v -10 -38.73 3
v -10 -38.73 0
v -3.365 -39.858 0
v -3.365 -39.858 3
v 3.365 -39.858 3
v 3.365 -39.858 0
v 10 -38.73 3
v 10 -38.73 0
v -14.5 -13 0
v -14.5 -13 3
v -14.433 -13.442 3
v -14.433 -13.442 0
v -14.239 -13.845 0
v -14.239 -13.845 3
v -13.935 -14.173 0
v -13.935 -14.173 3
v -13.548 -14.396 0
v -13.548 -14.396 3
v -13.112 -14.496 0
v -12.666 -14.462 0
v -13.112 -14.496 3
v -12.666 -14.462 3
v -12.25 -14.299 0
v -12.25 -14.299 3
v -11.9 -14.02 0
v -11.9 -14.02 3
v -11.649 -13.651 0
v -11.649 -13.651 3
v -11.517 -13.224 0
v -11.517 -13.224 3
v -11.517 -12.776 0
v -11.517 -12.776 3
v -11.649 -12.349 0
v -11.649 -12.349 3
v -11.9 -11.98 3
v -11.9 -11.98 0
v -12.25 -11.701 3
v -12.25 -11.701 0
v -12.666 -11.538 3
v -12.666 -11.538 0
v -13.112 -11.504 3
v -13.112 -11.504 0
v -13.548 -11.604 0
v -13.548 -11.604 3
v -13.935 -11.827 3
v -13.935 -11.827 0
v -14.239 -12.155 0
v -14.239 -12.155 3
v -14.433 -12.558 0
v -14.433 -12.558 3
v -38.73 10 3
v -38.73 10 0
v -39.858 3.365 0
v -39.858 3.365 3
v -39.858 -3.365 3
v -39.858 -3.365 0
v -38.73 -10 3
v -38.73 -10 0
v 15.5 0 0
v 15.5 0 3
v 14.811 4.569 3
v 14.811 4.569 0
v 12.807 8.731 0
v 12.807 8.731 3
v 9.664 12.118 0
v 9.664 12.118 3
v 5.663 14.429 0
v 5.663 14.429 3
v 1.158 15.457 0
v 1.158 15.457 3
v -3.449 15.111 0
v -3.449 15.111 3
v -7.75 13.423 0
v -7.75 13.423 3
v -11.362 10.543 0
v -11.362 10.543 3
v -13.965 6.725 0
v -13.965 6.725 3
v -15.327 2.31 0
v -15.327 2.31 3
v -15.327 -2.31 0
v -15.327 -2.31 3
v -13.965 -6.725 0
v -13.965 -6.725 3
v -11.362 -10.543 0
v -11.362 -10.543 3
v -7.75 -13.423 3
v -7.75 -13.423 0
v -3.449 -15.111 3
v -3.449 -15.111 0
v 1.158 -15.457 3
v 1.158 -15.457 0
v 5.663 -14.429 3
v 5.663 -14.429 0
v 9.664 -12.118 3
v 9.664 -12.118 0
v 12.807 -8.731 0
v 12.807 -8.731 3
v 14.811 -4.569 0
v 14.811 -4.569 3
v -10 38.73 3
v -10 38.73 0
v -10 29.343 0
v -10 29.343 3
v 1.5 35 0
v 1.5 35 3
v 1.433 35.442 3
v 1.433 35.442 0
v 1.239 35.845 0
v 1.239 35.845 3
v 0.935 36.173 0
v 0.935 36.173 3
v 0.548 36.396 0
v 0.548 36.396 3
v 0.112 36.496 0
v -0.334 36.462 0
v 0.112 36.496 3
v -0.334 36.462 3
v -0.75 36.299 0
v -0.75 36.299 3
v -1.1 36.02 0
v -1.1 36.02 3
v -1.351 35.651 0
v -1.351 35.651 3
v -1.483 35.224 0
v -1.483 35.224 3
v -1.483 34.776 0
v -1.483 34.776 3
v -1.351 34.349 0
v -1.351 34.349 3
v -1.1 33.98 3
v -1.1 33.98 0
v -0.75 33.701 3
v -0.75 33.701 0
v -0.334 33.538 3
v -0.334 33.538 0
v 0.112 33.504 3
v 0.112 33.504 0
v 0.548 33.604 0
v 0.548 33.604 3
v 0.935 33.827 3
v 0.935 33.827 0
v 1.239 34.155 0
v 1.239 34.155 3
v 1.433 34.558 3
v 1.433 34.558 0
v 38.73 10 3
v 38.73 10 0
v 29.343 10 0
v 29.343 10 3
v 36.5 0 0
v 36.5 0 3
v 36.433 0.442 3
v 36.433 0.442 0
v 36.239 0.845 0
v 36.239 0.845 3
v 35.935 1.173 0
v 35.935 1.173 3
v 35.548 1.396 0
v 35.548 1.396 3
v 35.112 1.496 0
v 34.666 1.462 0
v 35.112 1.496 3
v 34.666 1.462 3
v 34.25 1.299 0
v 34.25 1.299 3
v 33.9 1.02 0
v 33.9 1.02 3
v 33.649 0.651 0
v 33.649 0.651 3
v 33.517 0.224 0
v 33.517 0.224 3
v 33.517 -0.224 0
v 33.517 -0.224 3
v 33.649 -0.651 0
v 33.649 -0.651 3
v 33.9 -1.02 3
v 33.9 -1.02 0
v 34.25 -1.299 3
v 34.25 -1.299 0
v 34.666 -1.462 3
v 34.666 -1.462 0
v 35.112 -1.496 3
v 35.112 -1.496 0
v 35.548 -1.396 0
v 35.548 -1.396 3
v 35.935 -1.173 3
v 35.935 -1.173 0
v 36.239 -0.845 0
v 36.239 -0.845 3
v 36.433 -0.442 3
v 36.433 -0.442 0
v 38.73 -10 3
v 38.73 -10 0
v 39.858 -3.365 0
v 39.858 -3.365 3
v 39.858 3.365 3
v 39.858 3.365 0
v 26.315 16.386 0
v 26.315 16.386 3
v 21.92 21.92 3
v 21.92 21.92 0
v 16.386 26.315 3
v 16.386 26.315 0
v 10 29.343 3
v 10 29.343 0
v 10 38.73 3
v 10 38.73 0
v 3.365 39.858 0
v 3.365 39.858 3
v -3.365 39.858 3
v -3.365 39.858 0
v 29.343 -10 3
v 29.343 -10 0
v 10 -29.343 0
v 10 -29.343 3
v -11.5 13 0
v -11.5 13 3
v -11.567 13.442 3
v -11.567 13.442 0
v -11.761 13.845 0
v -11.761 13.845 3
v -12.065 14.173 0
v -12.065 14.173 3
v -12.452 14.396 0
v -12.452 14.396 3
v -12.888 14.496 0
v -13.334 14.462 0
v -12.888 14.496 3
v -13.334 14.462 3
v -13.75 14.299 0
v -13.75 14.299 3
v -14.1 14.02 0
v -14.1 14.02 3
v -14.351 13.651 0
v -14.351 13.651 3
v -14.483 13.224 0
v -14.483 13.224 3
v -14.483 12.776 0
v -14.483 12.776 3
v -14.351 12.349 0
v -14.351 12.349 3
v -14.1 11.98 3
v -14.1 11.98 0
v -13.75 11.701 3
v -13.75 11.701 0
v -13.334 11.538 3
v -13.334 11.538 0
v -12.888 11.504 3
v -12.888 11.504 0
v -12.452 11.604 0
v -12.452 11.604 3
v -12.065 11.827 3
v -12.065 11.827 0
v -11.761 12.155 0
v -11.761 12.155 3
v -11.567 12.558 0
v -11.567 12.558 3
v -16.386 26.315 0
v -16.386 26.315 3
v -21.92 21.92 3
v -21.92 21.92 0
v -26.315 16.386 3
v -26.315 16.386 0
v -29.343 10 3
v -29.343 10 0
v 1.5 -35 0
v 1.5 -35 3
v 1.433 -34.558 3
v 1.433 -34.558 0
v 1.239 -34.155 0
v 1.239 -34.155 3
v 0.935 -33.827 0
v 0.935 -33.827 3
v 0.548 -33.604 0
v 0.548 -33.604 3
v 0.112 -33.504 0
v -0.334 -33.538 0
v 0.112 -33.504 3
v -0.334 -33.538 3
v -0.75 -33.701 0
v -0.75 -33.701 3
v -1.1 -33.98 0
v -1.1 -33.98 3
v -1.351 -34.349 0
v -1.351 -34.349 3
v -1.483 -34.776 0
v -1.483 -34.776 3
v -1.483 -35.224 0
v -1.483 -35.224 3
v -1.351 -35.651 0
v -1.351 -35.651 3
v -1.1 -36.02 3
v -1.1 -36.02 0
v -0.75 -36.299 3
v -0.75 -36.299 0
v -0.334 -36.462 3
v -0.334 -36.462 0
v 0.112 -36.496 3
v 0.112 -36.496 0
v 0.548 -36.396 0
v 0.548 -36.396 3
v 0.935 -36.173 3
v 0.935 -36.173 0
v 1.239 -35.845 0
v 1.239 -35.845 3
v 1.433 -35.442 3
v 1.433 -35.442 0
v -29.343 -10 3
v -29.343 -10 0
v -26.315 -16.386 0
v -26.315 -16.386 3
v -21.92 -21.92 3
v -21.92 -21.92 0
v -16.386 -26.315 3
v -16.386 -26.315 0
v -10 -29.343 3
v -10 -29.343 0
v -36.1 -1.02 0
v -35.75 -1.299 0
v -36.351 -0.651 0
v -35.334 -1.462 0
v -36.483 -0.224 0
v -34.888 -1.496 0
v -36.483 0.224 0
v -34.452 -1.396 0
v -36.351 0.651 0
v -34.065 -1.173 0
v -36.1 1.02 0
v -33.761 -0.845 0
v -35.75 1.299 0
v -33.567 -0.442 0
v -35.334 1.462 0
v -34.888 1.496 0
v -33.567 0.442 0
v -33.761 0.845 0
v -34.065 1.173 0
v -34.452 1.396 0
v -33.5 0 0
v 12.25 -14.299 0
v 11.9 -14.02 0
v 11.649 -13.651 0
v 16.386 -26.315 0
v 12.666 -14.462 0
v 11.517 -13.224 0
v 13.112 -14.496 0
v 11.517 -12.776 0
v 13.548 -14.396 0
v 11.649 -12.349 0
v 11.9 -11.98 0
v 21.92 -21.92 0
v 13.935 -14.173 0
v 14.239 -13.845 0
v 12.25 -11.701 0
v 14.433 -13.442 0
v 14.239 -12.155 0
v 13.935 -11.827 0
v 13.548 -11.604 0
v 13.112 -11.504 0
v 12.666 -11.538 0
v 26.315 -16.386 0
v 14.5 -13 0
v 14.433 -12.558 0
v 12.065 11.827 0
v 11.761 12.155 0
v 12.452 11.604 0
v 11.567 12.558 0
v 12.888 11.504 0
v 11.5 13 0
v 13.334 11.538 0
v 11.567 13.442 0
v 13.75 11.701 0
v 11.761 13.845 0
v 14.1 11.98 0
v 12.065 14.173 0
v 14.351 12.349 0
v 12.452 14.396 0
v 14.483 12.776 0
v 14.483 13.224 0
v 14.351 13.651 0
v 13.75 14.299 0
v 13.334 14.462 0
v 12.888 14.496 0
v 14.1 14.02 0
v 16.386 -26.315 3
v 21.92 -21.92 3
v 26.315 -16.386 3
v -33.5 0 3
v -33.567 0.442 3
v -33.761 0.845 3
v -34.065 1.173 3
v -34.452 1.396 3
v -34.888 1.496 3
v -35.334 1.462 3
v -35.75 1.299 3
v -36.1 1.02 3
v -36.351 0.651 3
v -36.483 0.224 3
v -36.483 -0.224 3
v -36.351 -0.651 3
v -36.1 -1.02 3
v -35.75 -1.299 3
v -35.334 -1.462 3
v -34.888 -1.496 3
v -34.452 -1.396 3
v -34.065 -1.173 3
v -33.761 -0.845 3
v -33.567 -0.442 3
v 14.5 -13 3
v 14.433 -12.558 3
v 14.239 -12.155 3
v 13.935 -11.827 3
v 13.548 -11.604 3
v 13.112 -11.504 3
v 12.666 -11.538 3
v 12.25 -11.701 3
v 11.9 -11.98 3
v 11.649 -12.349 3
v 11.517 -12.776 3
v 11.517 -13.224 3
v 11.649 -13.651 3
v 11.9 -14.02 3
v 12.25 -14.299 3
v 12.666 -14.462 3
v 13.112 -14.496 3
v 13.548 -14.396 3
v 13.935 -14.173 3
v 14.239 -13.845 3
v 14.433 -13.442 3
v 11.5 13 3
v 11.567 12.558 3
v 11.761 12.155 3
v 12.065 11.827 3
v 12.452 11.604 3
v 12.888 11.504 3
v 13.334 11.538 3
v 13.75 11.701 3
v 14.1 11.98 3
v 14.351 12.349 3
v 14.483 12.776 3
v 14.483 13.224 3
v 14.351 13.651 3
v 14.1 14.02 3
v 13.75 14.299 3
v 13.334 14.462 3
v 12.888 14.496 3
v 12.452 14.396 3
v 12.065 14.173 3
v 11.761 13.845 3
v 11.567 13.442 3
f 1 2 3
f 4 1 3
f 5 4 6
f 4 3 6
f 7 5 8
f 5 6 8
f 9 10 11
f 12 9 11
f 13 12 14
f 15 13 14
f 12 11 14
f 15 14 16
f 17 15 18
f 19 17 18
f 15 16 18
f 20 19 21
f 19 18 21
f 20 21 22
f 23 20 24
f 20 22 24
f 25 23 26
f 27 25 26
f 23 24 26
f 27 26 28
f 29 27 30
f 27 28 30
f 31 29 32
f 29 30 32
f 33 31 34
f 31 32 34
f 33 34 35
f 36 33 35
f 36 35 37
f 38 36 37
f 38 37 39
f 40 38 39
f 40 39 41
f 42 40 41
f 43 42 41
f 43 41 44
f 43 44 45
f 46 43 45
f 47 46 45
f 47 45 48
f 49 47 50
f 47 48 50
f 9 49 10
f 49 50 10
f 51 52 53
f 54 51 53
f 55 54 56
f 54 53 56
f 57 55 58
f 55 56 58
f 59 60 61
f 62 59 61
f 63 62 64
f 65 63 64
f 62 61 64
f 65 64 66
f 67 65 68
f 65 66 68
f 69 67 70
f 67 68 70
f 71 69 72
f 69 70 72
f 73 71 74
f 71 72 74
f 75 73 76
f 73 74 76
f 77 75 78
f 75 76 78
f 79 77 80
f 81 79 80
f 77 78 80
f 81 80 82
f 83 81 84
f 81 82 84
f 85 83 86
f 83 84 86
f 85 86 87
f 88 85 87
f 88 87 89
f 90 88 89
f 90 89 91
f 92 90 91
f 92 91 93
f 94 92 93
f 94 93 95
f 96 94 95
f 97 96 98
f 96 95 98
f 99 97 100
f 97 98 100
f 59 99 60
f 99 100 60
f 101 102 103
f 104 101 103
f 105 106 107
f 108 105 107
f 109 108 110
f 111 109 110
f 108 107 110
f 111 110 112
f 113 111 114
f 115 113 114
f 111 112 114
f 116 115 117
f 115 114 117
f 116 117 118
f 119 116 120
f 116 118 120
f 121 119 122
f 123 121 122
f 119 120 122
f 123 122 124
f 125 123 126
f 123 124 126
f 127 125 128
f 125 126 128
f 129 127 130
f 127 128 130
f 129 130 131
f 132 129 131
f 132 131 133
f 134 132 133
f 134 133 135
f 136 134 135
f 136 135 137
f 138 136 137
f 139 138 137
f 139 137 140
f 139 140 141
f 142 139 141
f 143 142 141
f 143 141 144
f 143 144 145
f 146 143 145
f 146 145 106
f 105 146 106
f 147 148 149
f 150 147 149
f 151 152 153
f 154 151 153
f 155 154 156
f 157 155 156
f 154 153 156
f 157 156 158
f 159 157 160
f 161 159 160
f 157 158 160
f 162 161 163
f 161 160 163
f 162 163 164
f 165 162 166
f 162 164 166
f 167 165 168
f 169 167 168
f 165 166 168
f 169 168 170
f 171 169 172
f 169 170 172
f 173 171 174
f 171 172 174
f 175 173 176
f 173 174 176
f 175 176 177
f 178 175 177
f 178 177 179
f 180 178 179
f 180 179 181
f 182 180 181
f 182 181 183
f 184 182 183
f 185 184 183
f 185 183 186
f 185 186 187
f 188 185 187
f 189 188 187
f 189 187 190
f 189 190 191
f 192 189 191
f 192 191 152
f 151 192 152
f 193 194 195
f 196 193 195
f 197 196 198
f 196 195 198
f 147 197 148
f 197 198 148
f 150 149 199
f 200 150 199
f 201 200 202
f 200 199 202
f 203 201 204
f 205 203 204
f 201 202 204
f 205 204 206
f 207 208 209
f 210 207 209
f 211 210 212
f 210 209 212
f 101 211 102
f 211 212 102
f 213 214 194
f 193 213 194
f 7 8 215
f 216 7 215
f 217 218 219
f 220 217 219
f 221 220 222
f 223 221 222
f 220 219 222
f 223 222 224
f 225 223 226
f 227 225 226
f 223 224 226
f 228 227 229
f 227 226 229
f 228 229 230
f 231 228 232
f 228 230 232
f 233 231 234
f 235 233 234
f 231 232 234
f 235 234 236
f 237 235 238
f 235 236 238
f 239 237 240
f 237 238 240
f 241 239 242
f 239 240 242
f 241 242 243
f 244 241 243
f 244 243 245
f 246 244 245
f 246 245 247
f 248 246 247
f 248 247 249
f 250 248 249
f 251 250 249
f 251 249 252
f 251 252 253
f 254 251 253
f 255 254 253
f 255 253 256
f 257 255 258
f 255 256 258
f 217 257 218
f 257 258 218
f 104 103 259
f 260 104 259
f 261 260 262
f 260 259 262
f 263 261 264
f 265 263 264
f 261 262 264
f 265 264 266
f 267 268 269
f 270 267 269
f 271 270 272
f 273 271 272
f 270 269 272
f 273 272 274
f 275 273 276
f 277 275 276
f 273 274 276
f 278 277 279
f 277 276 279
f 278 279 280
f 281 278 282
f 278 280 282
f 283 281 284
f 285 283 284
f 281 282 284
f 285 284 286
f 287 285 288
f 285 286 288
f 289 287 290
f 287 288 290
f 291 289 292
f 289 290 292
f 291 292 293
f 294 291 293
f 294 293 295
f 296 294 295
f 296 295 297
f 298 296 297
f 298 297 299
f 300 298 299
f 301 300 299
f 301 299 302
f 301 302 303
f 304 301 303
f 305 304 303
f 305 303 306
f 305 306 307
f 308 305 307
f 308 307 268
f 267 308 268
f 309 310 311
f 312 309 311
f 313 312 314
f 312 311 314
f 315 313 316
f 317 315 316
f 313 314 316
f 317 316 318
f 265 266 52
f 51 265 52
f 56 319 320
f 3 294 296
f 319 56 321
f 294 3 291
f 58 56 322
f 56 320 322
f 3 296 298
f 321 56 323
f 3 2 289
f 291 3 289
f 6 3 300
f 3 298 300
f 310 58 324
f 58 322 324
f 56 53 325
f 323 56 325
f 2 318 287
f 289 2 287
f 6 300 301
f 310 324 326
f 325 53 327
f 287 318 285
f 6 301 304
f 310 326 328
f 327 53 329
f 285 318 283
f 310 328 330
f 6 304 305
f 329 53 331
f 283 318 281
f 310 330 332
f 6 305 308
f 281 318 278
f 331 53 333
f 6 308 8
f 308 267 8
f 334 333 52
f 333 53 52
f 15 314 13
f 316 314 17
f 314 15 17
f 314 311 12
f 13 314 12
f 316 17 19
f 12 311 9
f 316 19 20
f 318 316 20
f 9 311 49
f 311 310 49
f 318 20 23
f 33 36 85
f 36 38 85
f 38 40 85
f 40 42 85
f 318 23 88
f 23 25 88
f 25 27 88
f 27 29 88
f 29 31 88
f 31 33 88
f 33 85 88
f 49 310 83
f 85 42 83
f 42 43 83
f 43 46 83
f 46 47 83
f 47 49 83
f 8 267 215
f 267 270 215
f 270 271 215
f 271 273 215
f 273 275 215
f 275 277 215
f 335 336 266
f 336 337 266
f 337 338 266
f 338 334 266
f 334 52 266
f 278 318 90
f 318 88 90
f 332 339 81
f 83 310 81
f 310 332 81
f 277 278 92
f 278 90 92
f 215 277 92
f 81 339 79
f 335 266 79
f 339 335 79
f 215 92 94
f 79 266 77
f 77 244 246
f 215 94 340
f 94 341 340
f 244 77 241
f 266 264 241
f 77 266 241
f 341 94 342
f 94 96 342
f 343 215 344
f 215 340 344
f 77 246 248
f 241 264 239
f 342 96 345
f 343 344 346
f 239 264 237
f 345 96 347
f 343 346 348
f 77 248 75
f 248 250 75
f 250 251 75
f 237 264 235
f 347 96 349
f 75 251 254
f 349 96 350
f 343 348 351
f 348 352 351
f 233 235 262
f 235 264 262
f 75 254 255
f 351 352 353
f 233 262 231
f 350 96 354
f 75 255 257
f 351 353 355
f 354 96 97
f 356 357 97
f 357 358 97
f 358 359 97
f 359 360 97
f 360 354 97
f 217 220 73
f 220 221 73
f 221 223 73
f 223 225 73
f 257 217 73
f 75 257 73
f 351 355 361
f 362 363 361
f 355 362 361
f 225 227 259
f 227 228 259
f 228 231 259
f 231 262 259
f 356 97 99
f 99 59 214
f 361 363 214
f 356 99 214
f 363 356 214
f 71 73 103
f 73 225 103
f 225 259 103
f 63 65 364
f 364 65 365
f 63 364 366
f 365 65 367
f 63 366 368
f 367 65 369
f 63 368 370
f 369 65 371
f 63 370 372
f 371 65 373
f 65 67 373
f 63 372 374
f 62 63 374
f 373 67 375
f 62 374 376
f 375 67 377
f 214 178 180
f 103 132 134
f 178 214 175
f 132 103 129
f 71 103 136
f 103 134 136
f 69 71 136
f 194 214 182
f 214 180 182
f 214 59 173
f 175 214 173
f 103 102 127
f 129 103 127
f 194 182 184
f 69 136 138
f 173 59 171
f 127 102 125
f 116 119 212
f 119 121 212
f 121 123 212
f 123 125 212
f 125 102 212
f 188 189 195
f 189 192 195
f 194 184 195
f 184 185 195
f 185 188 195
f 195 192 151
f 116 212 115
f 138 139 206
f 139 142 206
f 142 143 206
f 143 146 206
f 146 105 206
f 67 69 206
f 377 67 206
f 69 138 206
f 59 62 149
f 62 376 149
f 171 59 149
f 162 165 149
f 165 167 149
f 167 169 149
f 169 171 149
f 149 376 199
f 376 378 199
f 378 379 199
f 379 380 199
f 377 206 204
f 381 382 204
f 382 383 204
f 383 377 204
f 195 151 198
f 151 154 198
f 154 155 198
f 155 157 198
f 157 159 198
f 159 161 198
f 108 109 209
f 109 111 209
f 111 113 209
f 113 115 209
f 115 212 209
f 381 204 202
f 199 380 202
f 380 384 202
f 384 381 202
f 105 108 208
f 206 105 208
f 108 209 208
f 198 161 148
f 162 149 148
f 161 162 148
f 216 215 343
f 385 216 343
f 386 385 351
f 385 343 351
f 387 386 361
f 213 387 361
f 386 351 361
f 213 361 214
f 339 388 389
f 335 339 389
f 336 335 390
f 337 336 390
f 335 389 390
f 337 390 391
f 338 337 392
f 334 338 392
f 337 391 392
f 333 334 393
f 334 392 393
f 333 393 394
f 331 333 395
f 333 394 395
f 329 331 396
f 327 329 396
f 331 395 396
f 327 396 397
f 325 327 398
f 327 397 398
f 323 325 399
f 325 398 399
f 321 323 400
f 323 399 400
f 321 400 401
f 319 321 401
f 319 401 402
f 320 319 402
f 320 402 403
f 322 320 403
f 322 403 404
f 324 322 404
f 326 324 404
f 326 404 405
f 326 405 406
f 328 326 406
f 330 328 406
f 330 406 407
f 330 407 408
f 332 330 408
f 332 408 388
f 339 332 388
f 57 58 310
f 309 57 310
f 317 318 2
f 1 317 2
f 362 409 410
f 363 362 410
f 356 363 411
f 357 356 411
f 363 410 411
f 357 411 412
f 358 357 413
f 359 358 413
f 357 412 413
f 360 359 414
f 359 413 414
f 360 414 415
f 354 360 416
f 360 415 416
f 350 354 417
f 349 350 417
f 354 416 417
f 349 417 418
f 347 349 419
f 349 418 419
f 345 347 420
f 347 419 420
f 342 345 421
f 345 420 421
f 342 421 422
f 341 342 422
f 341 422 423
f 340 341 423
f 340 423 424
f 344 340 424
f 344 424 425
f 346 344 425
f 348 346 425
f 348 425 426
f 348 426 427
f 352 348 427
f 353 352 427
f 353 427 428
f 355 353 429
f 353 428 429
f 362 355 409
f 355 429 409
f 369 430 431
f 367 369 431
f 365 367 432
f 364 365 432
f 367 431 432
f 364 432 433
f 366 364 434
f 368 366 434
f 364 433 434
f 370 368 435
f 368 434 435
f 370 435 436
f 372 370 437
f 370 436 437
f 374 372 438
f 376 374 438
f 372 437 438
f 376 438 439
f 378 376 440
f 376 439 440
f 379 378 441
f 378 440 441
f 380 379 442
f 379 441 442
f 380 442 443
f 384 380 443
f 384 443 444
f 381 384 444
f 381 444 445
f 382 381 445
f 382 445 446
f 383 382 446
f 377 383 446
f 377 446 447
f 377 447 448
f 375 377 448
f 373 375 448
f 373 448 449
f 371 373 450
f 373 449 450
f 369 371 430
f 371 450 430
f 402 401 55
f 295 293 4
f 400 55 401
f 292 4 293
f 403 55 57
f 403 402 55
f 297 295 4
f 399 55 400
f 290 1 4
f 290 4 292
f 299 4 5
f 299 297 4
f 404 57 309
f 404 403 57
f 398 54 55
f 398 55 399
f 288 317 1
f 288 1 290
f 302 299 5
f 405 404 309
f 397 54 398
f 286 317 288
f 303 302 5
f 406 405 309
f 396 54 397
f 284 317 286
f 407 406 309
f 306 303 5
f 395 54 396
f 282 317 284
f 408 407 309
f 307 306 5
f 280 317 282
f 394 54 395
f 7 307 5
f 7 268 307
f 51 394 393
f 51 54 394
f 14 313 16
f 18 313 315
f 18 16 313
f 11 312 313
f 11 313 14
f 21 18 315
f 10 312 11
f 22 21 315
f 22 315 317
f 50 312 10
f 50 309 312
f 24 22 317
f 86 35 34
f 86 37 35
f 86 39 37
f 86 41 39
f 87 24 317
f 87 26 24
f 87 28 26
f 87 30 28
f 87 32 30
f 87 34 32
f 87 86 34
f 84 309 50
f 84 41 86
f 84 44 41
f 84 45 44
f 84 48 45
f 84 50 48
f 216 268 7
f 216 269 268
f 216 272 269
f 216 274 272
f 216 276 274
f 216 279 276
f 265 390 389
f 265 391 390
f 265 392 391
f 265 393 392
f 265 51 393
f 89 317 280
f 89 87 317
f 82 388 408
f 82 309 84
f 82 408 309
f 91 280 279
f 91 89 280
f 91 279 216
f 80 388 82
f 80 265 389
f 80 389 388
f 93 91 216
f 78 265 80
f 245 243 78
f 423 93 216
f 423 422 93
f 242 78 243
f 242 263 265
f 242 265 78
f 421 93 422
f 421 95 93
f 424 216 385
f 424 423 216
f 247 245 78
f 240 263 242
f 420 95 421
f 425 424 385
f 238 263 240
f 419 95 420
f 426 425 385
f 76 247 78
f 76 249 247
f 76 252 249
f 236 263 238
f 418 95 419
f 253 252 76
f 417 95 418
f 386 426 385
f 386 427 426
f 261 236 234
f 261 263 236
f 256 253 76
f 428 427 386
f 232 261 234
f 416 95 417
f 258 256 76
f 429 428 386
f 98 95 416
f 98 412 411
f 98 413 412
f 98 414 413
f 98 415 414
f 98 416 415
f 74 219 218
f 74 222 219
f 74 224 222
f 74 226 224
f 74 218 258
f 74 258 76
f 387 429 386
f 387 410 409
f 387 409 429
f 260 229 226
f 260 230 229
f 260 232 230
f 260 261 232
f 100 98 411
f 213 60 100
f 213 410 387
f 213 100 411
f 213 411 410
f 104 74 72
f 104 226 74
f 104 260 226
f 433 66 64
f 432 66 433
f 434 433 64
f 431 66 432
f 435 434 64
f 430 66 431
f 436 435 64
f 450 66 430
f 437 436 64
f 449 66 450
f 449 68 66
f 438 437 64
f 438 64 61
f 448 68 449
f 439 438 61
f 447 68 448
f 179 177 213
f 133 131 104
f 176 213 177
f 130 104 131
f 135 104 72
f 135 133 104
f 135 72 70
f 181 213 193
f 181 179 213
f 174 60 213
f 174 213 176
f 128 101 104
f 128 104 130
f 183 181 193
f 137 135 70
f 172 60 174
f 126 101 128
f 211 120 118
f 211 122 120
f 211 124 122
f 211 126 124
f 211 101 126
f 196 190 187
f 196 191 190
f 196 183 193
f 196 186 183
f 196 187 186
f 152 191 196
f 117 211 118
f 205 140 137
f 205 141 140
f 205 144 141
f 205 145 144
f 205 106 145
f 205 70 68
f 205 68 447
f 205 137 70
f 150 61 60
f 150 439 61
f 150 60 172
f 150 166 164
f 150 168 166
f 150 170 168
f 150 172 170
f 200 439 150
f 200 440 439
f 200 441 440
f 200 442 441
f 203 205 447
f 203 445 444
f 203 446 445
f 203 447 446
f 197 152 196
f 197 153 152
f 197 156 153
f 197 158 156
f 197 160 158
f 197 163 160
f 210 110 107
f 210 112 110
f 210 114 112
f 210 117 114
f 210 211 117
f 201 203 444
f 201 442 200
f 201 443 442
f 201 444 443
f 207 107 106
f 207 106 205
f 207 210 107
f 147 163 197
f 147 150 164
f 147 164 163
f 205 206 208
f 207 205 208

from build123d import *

# Parameters (mm, degrees)
BOSS_EXTRUDE2_DEPTH = 3
CUT_EXTRUDE1_REACH  = 58.648
SKETCH3_R           = 1.5
SKETCH4_R           = 15.5
SKETCH4_R_2         = 1.5
CUT_EXTRUDE2_DEPTH  = 3


with BuildPart() as part:
    # Sketch2 → Boss-Extrude2 (new body)
    with BuildSketch(Plane.XY):
        with BuildLine():
            Line((-10, -29.342801502), (-10, -38.729833462))
            ThreePointArc((-10, -38.729833462), (0, -40), (10, -38.729833462))
            Line((10, -38.729833462), (10, -29.342801502))
            ThreePointArc((10, -29.342801502), (21.920310217, -21.920310217), (29.342801502, -10))
            Line((29.342801502, -10), (38.729833462, -10))
            ThreePointArc((38.729833462, -10), (40, 0), (38.729833462, 10))
            Line((38.729833462, 10), (29.342801502, 10))
            ThreePointArc((29.342801502, 10), (21.920310217, 21.920310217), (10, 29.342801502))
            Line((10, 29.342801502), (10, 38.729833462))
            ThreePointArc((10, 38.729833462), (0, 40), (-10, 38.729833462))
            Line((-10, 38.729833462), (-10, 29.342801502))
            ThreePointArc((-10, 29.342801502), (-21.920310217, 21.920310217), (-29.342801502, 10))
            Line((-29.342801502, 10), (-38.729833462, 10))
            ThreePointArc((-38.729833462, 10), (-40, 0), (-38.729833462, -10))
            Line((-38.729833462, -10), (-29.342801502, -10))
            ThreePointArc((-29.342801502, -10), (-21.920310217, -21.920310217), (-10, -29.342801502))
        make_face()
    extrude(amount=BOSS_EXTRUDE2_DEPTH)

    # Sketch3 → Cut-Extrude1 (cut, up to next)
    with BuildSketch(Plane.XY.offset(3), mode=Mode.PRIVATE) as cut_extrude1_sk1:
        with Locations((0, 35)):
            Circle(SKETCH3_R)
    cut_extrude1_tool1 = extrude(cut_extrude1_sk1.sketch, amount=-CUT_EXTRUDE1_REACH, mode=Mode.PRIVATE) & part.part
    # Sketch3 → Cut-Extrude1 (cut, up to next)
    with BuildSketch(Plane.XY.offset(3), mode=Mode.PRIVATE) as cut_extrude1_sk2:
        with Locations((35, 0)):
            Circle(SKETCH3_R)
    cut_extrude1_tool2 = extrude(cut_extrude1_sk2.sketch, amount=-CUT_EXTRUDE1_REACH, mode=Mode.PRIVATE) & part.part
    # Sketch3 → Cut-Extrude1 (cut, up to next)
    with BuildSketch(Plane.XY.offset(3), mode=Mode.PRIVATE) as cut_extrude1_sk3:
        with Locations((0, -35)):
            Circle(SKETCH3_R)
    cut_extrude1_tool3 = extrude(cut_extrude1_sk3.sketch, amount=-CUT_EXTRUDE1_REACH, mode=Mode.PRIVATE) & part.part
    # Sketch3 → Cut-Extrude1 (cut, up to next)
    with BuildSketch(Plane.XY.offset(3), mode=Mode.PRIVATE) as cut_extrude1_sk4:
        with Locations((-35, 0)):
            Circle(SKETCH3_R)
    cut_extrude1_tool4 = extrude(cut_extrude1_sk4.sketch, amount=-CUT_EXTRUDE1_REACH, mode=Mode.PRIVATE) & part.part
    add(cut_extrude1_tool1.solids().sort_by_distance((0, 35, 3))[0], mode=Mode.SUBTRACT)
    add(cut_extrude1_tool2.solids().sort_by_distance((35, 0, 3))[0], mode=Mode.SUBTRACT)
    add(cut_extrude1_tool3.solids().sort_by_distance((0, -35, 3))[0], mode=Mode.SUBTRACT)
    add(cut_extrude1_tool4.solids().sort_by_distance((-35, 0, 3))[0], mode=Mode.SUBTRACT)

    # Sketch4 → Cut-Extrude2 (cut)
    with BuildSketch(Plane.XY.offset(3)):
        Circle(SKETCH4_R)
        with Locations((-13, 13)):
            Circle(SKETCH4_R_2)
        with Locations(Location((-13, -13, 0), (0, 0, 180))):
            Circle(SKETCH4_R_2)
        with Locations((13, -13)):
            Circle(SKETCH4_R_2)
        with Locations(Location((13, 13, 0), (0, 0, 180))):
            Circle(SKETCH4_R_2)
    extrude(amount=-CUT_EXTRUDE2_DEPTH, mode=Mode.SUBTRACT)


solid = part.part
